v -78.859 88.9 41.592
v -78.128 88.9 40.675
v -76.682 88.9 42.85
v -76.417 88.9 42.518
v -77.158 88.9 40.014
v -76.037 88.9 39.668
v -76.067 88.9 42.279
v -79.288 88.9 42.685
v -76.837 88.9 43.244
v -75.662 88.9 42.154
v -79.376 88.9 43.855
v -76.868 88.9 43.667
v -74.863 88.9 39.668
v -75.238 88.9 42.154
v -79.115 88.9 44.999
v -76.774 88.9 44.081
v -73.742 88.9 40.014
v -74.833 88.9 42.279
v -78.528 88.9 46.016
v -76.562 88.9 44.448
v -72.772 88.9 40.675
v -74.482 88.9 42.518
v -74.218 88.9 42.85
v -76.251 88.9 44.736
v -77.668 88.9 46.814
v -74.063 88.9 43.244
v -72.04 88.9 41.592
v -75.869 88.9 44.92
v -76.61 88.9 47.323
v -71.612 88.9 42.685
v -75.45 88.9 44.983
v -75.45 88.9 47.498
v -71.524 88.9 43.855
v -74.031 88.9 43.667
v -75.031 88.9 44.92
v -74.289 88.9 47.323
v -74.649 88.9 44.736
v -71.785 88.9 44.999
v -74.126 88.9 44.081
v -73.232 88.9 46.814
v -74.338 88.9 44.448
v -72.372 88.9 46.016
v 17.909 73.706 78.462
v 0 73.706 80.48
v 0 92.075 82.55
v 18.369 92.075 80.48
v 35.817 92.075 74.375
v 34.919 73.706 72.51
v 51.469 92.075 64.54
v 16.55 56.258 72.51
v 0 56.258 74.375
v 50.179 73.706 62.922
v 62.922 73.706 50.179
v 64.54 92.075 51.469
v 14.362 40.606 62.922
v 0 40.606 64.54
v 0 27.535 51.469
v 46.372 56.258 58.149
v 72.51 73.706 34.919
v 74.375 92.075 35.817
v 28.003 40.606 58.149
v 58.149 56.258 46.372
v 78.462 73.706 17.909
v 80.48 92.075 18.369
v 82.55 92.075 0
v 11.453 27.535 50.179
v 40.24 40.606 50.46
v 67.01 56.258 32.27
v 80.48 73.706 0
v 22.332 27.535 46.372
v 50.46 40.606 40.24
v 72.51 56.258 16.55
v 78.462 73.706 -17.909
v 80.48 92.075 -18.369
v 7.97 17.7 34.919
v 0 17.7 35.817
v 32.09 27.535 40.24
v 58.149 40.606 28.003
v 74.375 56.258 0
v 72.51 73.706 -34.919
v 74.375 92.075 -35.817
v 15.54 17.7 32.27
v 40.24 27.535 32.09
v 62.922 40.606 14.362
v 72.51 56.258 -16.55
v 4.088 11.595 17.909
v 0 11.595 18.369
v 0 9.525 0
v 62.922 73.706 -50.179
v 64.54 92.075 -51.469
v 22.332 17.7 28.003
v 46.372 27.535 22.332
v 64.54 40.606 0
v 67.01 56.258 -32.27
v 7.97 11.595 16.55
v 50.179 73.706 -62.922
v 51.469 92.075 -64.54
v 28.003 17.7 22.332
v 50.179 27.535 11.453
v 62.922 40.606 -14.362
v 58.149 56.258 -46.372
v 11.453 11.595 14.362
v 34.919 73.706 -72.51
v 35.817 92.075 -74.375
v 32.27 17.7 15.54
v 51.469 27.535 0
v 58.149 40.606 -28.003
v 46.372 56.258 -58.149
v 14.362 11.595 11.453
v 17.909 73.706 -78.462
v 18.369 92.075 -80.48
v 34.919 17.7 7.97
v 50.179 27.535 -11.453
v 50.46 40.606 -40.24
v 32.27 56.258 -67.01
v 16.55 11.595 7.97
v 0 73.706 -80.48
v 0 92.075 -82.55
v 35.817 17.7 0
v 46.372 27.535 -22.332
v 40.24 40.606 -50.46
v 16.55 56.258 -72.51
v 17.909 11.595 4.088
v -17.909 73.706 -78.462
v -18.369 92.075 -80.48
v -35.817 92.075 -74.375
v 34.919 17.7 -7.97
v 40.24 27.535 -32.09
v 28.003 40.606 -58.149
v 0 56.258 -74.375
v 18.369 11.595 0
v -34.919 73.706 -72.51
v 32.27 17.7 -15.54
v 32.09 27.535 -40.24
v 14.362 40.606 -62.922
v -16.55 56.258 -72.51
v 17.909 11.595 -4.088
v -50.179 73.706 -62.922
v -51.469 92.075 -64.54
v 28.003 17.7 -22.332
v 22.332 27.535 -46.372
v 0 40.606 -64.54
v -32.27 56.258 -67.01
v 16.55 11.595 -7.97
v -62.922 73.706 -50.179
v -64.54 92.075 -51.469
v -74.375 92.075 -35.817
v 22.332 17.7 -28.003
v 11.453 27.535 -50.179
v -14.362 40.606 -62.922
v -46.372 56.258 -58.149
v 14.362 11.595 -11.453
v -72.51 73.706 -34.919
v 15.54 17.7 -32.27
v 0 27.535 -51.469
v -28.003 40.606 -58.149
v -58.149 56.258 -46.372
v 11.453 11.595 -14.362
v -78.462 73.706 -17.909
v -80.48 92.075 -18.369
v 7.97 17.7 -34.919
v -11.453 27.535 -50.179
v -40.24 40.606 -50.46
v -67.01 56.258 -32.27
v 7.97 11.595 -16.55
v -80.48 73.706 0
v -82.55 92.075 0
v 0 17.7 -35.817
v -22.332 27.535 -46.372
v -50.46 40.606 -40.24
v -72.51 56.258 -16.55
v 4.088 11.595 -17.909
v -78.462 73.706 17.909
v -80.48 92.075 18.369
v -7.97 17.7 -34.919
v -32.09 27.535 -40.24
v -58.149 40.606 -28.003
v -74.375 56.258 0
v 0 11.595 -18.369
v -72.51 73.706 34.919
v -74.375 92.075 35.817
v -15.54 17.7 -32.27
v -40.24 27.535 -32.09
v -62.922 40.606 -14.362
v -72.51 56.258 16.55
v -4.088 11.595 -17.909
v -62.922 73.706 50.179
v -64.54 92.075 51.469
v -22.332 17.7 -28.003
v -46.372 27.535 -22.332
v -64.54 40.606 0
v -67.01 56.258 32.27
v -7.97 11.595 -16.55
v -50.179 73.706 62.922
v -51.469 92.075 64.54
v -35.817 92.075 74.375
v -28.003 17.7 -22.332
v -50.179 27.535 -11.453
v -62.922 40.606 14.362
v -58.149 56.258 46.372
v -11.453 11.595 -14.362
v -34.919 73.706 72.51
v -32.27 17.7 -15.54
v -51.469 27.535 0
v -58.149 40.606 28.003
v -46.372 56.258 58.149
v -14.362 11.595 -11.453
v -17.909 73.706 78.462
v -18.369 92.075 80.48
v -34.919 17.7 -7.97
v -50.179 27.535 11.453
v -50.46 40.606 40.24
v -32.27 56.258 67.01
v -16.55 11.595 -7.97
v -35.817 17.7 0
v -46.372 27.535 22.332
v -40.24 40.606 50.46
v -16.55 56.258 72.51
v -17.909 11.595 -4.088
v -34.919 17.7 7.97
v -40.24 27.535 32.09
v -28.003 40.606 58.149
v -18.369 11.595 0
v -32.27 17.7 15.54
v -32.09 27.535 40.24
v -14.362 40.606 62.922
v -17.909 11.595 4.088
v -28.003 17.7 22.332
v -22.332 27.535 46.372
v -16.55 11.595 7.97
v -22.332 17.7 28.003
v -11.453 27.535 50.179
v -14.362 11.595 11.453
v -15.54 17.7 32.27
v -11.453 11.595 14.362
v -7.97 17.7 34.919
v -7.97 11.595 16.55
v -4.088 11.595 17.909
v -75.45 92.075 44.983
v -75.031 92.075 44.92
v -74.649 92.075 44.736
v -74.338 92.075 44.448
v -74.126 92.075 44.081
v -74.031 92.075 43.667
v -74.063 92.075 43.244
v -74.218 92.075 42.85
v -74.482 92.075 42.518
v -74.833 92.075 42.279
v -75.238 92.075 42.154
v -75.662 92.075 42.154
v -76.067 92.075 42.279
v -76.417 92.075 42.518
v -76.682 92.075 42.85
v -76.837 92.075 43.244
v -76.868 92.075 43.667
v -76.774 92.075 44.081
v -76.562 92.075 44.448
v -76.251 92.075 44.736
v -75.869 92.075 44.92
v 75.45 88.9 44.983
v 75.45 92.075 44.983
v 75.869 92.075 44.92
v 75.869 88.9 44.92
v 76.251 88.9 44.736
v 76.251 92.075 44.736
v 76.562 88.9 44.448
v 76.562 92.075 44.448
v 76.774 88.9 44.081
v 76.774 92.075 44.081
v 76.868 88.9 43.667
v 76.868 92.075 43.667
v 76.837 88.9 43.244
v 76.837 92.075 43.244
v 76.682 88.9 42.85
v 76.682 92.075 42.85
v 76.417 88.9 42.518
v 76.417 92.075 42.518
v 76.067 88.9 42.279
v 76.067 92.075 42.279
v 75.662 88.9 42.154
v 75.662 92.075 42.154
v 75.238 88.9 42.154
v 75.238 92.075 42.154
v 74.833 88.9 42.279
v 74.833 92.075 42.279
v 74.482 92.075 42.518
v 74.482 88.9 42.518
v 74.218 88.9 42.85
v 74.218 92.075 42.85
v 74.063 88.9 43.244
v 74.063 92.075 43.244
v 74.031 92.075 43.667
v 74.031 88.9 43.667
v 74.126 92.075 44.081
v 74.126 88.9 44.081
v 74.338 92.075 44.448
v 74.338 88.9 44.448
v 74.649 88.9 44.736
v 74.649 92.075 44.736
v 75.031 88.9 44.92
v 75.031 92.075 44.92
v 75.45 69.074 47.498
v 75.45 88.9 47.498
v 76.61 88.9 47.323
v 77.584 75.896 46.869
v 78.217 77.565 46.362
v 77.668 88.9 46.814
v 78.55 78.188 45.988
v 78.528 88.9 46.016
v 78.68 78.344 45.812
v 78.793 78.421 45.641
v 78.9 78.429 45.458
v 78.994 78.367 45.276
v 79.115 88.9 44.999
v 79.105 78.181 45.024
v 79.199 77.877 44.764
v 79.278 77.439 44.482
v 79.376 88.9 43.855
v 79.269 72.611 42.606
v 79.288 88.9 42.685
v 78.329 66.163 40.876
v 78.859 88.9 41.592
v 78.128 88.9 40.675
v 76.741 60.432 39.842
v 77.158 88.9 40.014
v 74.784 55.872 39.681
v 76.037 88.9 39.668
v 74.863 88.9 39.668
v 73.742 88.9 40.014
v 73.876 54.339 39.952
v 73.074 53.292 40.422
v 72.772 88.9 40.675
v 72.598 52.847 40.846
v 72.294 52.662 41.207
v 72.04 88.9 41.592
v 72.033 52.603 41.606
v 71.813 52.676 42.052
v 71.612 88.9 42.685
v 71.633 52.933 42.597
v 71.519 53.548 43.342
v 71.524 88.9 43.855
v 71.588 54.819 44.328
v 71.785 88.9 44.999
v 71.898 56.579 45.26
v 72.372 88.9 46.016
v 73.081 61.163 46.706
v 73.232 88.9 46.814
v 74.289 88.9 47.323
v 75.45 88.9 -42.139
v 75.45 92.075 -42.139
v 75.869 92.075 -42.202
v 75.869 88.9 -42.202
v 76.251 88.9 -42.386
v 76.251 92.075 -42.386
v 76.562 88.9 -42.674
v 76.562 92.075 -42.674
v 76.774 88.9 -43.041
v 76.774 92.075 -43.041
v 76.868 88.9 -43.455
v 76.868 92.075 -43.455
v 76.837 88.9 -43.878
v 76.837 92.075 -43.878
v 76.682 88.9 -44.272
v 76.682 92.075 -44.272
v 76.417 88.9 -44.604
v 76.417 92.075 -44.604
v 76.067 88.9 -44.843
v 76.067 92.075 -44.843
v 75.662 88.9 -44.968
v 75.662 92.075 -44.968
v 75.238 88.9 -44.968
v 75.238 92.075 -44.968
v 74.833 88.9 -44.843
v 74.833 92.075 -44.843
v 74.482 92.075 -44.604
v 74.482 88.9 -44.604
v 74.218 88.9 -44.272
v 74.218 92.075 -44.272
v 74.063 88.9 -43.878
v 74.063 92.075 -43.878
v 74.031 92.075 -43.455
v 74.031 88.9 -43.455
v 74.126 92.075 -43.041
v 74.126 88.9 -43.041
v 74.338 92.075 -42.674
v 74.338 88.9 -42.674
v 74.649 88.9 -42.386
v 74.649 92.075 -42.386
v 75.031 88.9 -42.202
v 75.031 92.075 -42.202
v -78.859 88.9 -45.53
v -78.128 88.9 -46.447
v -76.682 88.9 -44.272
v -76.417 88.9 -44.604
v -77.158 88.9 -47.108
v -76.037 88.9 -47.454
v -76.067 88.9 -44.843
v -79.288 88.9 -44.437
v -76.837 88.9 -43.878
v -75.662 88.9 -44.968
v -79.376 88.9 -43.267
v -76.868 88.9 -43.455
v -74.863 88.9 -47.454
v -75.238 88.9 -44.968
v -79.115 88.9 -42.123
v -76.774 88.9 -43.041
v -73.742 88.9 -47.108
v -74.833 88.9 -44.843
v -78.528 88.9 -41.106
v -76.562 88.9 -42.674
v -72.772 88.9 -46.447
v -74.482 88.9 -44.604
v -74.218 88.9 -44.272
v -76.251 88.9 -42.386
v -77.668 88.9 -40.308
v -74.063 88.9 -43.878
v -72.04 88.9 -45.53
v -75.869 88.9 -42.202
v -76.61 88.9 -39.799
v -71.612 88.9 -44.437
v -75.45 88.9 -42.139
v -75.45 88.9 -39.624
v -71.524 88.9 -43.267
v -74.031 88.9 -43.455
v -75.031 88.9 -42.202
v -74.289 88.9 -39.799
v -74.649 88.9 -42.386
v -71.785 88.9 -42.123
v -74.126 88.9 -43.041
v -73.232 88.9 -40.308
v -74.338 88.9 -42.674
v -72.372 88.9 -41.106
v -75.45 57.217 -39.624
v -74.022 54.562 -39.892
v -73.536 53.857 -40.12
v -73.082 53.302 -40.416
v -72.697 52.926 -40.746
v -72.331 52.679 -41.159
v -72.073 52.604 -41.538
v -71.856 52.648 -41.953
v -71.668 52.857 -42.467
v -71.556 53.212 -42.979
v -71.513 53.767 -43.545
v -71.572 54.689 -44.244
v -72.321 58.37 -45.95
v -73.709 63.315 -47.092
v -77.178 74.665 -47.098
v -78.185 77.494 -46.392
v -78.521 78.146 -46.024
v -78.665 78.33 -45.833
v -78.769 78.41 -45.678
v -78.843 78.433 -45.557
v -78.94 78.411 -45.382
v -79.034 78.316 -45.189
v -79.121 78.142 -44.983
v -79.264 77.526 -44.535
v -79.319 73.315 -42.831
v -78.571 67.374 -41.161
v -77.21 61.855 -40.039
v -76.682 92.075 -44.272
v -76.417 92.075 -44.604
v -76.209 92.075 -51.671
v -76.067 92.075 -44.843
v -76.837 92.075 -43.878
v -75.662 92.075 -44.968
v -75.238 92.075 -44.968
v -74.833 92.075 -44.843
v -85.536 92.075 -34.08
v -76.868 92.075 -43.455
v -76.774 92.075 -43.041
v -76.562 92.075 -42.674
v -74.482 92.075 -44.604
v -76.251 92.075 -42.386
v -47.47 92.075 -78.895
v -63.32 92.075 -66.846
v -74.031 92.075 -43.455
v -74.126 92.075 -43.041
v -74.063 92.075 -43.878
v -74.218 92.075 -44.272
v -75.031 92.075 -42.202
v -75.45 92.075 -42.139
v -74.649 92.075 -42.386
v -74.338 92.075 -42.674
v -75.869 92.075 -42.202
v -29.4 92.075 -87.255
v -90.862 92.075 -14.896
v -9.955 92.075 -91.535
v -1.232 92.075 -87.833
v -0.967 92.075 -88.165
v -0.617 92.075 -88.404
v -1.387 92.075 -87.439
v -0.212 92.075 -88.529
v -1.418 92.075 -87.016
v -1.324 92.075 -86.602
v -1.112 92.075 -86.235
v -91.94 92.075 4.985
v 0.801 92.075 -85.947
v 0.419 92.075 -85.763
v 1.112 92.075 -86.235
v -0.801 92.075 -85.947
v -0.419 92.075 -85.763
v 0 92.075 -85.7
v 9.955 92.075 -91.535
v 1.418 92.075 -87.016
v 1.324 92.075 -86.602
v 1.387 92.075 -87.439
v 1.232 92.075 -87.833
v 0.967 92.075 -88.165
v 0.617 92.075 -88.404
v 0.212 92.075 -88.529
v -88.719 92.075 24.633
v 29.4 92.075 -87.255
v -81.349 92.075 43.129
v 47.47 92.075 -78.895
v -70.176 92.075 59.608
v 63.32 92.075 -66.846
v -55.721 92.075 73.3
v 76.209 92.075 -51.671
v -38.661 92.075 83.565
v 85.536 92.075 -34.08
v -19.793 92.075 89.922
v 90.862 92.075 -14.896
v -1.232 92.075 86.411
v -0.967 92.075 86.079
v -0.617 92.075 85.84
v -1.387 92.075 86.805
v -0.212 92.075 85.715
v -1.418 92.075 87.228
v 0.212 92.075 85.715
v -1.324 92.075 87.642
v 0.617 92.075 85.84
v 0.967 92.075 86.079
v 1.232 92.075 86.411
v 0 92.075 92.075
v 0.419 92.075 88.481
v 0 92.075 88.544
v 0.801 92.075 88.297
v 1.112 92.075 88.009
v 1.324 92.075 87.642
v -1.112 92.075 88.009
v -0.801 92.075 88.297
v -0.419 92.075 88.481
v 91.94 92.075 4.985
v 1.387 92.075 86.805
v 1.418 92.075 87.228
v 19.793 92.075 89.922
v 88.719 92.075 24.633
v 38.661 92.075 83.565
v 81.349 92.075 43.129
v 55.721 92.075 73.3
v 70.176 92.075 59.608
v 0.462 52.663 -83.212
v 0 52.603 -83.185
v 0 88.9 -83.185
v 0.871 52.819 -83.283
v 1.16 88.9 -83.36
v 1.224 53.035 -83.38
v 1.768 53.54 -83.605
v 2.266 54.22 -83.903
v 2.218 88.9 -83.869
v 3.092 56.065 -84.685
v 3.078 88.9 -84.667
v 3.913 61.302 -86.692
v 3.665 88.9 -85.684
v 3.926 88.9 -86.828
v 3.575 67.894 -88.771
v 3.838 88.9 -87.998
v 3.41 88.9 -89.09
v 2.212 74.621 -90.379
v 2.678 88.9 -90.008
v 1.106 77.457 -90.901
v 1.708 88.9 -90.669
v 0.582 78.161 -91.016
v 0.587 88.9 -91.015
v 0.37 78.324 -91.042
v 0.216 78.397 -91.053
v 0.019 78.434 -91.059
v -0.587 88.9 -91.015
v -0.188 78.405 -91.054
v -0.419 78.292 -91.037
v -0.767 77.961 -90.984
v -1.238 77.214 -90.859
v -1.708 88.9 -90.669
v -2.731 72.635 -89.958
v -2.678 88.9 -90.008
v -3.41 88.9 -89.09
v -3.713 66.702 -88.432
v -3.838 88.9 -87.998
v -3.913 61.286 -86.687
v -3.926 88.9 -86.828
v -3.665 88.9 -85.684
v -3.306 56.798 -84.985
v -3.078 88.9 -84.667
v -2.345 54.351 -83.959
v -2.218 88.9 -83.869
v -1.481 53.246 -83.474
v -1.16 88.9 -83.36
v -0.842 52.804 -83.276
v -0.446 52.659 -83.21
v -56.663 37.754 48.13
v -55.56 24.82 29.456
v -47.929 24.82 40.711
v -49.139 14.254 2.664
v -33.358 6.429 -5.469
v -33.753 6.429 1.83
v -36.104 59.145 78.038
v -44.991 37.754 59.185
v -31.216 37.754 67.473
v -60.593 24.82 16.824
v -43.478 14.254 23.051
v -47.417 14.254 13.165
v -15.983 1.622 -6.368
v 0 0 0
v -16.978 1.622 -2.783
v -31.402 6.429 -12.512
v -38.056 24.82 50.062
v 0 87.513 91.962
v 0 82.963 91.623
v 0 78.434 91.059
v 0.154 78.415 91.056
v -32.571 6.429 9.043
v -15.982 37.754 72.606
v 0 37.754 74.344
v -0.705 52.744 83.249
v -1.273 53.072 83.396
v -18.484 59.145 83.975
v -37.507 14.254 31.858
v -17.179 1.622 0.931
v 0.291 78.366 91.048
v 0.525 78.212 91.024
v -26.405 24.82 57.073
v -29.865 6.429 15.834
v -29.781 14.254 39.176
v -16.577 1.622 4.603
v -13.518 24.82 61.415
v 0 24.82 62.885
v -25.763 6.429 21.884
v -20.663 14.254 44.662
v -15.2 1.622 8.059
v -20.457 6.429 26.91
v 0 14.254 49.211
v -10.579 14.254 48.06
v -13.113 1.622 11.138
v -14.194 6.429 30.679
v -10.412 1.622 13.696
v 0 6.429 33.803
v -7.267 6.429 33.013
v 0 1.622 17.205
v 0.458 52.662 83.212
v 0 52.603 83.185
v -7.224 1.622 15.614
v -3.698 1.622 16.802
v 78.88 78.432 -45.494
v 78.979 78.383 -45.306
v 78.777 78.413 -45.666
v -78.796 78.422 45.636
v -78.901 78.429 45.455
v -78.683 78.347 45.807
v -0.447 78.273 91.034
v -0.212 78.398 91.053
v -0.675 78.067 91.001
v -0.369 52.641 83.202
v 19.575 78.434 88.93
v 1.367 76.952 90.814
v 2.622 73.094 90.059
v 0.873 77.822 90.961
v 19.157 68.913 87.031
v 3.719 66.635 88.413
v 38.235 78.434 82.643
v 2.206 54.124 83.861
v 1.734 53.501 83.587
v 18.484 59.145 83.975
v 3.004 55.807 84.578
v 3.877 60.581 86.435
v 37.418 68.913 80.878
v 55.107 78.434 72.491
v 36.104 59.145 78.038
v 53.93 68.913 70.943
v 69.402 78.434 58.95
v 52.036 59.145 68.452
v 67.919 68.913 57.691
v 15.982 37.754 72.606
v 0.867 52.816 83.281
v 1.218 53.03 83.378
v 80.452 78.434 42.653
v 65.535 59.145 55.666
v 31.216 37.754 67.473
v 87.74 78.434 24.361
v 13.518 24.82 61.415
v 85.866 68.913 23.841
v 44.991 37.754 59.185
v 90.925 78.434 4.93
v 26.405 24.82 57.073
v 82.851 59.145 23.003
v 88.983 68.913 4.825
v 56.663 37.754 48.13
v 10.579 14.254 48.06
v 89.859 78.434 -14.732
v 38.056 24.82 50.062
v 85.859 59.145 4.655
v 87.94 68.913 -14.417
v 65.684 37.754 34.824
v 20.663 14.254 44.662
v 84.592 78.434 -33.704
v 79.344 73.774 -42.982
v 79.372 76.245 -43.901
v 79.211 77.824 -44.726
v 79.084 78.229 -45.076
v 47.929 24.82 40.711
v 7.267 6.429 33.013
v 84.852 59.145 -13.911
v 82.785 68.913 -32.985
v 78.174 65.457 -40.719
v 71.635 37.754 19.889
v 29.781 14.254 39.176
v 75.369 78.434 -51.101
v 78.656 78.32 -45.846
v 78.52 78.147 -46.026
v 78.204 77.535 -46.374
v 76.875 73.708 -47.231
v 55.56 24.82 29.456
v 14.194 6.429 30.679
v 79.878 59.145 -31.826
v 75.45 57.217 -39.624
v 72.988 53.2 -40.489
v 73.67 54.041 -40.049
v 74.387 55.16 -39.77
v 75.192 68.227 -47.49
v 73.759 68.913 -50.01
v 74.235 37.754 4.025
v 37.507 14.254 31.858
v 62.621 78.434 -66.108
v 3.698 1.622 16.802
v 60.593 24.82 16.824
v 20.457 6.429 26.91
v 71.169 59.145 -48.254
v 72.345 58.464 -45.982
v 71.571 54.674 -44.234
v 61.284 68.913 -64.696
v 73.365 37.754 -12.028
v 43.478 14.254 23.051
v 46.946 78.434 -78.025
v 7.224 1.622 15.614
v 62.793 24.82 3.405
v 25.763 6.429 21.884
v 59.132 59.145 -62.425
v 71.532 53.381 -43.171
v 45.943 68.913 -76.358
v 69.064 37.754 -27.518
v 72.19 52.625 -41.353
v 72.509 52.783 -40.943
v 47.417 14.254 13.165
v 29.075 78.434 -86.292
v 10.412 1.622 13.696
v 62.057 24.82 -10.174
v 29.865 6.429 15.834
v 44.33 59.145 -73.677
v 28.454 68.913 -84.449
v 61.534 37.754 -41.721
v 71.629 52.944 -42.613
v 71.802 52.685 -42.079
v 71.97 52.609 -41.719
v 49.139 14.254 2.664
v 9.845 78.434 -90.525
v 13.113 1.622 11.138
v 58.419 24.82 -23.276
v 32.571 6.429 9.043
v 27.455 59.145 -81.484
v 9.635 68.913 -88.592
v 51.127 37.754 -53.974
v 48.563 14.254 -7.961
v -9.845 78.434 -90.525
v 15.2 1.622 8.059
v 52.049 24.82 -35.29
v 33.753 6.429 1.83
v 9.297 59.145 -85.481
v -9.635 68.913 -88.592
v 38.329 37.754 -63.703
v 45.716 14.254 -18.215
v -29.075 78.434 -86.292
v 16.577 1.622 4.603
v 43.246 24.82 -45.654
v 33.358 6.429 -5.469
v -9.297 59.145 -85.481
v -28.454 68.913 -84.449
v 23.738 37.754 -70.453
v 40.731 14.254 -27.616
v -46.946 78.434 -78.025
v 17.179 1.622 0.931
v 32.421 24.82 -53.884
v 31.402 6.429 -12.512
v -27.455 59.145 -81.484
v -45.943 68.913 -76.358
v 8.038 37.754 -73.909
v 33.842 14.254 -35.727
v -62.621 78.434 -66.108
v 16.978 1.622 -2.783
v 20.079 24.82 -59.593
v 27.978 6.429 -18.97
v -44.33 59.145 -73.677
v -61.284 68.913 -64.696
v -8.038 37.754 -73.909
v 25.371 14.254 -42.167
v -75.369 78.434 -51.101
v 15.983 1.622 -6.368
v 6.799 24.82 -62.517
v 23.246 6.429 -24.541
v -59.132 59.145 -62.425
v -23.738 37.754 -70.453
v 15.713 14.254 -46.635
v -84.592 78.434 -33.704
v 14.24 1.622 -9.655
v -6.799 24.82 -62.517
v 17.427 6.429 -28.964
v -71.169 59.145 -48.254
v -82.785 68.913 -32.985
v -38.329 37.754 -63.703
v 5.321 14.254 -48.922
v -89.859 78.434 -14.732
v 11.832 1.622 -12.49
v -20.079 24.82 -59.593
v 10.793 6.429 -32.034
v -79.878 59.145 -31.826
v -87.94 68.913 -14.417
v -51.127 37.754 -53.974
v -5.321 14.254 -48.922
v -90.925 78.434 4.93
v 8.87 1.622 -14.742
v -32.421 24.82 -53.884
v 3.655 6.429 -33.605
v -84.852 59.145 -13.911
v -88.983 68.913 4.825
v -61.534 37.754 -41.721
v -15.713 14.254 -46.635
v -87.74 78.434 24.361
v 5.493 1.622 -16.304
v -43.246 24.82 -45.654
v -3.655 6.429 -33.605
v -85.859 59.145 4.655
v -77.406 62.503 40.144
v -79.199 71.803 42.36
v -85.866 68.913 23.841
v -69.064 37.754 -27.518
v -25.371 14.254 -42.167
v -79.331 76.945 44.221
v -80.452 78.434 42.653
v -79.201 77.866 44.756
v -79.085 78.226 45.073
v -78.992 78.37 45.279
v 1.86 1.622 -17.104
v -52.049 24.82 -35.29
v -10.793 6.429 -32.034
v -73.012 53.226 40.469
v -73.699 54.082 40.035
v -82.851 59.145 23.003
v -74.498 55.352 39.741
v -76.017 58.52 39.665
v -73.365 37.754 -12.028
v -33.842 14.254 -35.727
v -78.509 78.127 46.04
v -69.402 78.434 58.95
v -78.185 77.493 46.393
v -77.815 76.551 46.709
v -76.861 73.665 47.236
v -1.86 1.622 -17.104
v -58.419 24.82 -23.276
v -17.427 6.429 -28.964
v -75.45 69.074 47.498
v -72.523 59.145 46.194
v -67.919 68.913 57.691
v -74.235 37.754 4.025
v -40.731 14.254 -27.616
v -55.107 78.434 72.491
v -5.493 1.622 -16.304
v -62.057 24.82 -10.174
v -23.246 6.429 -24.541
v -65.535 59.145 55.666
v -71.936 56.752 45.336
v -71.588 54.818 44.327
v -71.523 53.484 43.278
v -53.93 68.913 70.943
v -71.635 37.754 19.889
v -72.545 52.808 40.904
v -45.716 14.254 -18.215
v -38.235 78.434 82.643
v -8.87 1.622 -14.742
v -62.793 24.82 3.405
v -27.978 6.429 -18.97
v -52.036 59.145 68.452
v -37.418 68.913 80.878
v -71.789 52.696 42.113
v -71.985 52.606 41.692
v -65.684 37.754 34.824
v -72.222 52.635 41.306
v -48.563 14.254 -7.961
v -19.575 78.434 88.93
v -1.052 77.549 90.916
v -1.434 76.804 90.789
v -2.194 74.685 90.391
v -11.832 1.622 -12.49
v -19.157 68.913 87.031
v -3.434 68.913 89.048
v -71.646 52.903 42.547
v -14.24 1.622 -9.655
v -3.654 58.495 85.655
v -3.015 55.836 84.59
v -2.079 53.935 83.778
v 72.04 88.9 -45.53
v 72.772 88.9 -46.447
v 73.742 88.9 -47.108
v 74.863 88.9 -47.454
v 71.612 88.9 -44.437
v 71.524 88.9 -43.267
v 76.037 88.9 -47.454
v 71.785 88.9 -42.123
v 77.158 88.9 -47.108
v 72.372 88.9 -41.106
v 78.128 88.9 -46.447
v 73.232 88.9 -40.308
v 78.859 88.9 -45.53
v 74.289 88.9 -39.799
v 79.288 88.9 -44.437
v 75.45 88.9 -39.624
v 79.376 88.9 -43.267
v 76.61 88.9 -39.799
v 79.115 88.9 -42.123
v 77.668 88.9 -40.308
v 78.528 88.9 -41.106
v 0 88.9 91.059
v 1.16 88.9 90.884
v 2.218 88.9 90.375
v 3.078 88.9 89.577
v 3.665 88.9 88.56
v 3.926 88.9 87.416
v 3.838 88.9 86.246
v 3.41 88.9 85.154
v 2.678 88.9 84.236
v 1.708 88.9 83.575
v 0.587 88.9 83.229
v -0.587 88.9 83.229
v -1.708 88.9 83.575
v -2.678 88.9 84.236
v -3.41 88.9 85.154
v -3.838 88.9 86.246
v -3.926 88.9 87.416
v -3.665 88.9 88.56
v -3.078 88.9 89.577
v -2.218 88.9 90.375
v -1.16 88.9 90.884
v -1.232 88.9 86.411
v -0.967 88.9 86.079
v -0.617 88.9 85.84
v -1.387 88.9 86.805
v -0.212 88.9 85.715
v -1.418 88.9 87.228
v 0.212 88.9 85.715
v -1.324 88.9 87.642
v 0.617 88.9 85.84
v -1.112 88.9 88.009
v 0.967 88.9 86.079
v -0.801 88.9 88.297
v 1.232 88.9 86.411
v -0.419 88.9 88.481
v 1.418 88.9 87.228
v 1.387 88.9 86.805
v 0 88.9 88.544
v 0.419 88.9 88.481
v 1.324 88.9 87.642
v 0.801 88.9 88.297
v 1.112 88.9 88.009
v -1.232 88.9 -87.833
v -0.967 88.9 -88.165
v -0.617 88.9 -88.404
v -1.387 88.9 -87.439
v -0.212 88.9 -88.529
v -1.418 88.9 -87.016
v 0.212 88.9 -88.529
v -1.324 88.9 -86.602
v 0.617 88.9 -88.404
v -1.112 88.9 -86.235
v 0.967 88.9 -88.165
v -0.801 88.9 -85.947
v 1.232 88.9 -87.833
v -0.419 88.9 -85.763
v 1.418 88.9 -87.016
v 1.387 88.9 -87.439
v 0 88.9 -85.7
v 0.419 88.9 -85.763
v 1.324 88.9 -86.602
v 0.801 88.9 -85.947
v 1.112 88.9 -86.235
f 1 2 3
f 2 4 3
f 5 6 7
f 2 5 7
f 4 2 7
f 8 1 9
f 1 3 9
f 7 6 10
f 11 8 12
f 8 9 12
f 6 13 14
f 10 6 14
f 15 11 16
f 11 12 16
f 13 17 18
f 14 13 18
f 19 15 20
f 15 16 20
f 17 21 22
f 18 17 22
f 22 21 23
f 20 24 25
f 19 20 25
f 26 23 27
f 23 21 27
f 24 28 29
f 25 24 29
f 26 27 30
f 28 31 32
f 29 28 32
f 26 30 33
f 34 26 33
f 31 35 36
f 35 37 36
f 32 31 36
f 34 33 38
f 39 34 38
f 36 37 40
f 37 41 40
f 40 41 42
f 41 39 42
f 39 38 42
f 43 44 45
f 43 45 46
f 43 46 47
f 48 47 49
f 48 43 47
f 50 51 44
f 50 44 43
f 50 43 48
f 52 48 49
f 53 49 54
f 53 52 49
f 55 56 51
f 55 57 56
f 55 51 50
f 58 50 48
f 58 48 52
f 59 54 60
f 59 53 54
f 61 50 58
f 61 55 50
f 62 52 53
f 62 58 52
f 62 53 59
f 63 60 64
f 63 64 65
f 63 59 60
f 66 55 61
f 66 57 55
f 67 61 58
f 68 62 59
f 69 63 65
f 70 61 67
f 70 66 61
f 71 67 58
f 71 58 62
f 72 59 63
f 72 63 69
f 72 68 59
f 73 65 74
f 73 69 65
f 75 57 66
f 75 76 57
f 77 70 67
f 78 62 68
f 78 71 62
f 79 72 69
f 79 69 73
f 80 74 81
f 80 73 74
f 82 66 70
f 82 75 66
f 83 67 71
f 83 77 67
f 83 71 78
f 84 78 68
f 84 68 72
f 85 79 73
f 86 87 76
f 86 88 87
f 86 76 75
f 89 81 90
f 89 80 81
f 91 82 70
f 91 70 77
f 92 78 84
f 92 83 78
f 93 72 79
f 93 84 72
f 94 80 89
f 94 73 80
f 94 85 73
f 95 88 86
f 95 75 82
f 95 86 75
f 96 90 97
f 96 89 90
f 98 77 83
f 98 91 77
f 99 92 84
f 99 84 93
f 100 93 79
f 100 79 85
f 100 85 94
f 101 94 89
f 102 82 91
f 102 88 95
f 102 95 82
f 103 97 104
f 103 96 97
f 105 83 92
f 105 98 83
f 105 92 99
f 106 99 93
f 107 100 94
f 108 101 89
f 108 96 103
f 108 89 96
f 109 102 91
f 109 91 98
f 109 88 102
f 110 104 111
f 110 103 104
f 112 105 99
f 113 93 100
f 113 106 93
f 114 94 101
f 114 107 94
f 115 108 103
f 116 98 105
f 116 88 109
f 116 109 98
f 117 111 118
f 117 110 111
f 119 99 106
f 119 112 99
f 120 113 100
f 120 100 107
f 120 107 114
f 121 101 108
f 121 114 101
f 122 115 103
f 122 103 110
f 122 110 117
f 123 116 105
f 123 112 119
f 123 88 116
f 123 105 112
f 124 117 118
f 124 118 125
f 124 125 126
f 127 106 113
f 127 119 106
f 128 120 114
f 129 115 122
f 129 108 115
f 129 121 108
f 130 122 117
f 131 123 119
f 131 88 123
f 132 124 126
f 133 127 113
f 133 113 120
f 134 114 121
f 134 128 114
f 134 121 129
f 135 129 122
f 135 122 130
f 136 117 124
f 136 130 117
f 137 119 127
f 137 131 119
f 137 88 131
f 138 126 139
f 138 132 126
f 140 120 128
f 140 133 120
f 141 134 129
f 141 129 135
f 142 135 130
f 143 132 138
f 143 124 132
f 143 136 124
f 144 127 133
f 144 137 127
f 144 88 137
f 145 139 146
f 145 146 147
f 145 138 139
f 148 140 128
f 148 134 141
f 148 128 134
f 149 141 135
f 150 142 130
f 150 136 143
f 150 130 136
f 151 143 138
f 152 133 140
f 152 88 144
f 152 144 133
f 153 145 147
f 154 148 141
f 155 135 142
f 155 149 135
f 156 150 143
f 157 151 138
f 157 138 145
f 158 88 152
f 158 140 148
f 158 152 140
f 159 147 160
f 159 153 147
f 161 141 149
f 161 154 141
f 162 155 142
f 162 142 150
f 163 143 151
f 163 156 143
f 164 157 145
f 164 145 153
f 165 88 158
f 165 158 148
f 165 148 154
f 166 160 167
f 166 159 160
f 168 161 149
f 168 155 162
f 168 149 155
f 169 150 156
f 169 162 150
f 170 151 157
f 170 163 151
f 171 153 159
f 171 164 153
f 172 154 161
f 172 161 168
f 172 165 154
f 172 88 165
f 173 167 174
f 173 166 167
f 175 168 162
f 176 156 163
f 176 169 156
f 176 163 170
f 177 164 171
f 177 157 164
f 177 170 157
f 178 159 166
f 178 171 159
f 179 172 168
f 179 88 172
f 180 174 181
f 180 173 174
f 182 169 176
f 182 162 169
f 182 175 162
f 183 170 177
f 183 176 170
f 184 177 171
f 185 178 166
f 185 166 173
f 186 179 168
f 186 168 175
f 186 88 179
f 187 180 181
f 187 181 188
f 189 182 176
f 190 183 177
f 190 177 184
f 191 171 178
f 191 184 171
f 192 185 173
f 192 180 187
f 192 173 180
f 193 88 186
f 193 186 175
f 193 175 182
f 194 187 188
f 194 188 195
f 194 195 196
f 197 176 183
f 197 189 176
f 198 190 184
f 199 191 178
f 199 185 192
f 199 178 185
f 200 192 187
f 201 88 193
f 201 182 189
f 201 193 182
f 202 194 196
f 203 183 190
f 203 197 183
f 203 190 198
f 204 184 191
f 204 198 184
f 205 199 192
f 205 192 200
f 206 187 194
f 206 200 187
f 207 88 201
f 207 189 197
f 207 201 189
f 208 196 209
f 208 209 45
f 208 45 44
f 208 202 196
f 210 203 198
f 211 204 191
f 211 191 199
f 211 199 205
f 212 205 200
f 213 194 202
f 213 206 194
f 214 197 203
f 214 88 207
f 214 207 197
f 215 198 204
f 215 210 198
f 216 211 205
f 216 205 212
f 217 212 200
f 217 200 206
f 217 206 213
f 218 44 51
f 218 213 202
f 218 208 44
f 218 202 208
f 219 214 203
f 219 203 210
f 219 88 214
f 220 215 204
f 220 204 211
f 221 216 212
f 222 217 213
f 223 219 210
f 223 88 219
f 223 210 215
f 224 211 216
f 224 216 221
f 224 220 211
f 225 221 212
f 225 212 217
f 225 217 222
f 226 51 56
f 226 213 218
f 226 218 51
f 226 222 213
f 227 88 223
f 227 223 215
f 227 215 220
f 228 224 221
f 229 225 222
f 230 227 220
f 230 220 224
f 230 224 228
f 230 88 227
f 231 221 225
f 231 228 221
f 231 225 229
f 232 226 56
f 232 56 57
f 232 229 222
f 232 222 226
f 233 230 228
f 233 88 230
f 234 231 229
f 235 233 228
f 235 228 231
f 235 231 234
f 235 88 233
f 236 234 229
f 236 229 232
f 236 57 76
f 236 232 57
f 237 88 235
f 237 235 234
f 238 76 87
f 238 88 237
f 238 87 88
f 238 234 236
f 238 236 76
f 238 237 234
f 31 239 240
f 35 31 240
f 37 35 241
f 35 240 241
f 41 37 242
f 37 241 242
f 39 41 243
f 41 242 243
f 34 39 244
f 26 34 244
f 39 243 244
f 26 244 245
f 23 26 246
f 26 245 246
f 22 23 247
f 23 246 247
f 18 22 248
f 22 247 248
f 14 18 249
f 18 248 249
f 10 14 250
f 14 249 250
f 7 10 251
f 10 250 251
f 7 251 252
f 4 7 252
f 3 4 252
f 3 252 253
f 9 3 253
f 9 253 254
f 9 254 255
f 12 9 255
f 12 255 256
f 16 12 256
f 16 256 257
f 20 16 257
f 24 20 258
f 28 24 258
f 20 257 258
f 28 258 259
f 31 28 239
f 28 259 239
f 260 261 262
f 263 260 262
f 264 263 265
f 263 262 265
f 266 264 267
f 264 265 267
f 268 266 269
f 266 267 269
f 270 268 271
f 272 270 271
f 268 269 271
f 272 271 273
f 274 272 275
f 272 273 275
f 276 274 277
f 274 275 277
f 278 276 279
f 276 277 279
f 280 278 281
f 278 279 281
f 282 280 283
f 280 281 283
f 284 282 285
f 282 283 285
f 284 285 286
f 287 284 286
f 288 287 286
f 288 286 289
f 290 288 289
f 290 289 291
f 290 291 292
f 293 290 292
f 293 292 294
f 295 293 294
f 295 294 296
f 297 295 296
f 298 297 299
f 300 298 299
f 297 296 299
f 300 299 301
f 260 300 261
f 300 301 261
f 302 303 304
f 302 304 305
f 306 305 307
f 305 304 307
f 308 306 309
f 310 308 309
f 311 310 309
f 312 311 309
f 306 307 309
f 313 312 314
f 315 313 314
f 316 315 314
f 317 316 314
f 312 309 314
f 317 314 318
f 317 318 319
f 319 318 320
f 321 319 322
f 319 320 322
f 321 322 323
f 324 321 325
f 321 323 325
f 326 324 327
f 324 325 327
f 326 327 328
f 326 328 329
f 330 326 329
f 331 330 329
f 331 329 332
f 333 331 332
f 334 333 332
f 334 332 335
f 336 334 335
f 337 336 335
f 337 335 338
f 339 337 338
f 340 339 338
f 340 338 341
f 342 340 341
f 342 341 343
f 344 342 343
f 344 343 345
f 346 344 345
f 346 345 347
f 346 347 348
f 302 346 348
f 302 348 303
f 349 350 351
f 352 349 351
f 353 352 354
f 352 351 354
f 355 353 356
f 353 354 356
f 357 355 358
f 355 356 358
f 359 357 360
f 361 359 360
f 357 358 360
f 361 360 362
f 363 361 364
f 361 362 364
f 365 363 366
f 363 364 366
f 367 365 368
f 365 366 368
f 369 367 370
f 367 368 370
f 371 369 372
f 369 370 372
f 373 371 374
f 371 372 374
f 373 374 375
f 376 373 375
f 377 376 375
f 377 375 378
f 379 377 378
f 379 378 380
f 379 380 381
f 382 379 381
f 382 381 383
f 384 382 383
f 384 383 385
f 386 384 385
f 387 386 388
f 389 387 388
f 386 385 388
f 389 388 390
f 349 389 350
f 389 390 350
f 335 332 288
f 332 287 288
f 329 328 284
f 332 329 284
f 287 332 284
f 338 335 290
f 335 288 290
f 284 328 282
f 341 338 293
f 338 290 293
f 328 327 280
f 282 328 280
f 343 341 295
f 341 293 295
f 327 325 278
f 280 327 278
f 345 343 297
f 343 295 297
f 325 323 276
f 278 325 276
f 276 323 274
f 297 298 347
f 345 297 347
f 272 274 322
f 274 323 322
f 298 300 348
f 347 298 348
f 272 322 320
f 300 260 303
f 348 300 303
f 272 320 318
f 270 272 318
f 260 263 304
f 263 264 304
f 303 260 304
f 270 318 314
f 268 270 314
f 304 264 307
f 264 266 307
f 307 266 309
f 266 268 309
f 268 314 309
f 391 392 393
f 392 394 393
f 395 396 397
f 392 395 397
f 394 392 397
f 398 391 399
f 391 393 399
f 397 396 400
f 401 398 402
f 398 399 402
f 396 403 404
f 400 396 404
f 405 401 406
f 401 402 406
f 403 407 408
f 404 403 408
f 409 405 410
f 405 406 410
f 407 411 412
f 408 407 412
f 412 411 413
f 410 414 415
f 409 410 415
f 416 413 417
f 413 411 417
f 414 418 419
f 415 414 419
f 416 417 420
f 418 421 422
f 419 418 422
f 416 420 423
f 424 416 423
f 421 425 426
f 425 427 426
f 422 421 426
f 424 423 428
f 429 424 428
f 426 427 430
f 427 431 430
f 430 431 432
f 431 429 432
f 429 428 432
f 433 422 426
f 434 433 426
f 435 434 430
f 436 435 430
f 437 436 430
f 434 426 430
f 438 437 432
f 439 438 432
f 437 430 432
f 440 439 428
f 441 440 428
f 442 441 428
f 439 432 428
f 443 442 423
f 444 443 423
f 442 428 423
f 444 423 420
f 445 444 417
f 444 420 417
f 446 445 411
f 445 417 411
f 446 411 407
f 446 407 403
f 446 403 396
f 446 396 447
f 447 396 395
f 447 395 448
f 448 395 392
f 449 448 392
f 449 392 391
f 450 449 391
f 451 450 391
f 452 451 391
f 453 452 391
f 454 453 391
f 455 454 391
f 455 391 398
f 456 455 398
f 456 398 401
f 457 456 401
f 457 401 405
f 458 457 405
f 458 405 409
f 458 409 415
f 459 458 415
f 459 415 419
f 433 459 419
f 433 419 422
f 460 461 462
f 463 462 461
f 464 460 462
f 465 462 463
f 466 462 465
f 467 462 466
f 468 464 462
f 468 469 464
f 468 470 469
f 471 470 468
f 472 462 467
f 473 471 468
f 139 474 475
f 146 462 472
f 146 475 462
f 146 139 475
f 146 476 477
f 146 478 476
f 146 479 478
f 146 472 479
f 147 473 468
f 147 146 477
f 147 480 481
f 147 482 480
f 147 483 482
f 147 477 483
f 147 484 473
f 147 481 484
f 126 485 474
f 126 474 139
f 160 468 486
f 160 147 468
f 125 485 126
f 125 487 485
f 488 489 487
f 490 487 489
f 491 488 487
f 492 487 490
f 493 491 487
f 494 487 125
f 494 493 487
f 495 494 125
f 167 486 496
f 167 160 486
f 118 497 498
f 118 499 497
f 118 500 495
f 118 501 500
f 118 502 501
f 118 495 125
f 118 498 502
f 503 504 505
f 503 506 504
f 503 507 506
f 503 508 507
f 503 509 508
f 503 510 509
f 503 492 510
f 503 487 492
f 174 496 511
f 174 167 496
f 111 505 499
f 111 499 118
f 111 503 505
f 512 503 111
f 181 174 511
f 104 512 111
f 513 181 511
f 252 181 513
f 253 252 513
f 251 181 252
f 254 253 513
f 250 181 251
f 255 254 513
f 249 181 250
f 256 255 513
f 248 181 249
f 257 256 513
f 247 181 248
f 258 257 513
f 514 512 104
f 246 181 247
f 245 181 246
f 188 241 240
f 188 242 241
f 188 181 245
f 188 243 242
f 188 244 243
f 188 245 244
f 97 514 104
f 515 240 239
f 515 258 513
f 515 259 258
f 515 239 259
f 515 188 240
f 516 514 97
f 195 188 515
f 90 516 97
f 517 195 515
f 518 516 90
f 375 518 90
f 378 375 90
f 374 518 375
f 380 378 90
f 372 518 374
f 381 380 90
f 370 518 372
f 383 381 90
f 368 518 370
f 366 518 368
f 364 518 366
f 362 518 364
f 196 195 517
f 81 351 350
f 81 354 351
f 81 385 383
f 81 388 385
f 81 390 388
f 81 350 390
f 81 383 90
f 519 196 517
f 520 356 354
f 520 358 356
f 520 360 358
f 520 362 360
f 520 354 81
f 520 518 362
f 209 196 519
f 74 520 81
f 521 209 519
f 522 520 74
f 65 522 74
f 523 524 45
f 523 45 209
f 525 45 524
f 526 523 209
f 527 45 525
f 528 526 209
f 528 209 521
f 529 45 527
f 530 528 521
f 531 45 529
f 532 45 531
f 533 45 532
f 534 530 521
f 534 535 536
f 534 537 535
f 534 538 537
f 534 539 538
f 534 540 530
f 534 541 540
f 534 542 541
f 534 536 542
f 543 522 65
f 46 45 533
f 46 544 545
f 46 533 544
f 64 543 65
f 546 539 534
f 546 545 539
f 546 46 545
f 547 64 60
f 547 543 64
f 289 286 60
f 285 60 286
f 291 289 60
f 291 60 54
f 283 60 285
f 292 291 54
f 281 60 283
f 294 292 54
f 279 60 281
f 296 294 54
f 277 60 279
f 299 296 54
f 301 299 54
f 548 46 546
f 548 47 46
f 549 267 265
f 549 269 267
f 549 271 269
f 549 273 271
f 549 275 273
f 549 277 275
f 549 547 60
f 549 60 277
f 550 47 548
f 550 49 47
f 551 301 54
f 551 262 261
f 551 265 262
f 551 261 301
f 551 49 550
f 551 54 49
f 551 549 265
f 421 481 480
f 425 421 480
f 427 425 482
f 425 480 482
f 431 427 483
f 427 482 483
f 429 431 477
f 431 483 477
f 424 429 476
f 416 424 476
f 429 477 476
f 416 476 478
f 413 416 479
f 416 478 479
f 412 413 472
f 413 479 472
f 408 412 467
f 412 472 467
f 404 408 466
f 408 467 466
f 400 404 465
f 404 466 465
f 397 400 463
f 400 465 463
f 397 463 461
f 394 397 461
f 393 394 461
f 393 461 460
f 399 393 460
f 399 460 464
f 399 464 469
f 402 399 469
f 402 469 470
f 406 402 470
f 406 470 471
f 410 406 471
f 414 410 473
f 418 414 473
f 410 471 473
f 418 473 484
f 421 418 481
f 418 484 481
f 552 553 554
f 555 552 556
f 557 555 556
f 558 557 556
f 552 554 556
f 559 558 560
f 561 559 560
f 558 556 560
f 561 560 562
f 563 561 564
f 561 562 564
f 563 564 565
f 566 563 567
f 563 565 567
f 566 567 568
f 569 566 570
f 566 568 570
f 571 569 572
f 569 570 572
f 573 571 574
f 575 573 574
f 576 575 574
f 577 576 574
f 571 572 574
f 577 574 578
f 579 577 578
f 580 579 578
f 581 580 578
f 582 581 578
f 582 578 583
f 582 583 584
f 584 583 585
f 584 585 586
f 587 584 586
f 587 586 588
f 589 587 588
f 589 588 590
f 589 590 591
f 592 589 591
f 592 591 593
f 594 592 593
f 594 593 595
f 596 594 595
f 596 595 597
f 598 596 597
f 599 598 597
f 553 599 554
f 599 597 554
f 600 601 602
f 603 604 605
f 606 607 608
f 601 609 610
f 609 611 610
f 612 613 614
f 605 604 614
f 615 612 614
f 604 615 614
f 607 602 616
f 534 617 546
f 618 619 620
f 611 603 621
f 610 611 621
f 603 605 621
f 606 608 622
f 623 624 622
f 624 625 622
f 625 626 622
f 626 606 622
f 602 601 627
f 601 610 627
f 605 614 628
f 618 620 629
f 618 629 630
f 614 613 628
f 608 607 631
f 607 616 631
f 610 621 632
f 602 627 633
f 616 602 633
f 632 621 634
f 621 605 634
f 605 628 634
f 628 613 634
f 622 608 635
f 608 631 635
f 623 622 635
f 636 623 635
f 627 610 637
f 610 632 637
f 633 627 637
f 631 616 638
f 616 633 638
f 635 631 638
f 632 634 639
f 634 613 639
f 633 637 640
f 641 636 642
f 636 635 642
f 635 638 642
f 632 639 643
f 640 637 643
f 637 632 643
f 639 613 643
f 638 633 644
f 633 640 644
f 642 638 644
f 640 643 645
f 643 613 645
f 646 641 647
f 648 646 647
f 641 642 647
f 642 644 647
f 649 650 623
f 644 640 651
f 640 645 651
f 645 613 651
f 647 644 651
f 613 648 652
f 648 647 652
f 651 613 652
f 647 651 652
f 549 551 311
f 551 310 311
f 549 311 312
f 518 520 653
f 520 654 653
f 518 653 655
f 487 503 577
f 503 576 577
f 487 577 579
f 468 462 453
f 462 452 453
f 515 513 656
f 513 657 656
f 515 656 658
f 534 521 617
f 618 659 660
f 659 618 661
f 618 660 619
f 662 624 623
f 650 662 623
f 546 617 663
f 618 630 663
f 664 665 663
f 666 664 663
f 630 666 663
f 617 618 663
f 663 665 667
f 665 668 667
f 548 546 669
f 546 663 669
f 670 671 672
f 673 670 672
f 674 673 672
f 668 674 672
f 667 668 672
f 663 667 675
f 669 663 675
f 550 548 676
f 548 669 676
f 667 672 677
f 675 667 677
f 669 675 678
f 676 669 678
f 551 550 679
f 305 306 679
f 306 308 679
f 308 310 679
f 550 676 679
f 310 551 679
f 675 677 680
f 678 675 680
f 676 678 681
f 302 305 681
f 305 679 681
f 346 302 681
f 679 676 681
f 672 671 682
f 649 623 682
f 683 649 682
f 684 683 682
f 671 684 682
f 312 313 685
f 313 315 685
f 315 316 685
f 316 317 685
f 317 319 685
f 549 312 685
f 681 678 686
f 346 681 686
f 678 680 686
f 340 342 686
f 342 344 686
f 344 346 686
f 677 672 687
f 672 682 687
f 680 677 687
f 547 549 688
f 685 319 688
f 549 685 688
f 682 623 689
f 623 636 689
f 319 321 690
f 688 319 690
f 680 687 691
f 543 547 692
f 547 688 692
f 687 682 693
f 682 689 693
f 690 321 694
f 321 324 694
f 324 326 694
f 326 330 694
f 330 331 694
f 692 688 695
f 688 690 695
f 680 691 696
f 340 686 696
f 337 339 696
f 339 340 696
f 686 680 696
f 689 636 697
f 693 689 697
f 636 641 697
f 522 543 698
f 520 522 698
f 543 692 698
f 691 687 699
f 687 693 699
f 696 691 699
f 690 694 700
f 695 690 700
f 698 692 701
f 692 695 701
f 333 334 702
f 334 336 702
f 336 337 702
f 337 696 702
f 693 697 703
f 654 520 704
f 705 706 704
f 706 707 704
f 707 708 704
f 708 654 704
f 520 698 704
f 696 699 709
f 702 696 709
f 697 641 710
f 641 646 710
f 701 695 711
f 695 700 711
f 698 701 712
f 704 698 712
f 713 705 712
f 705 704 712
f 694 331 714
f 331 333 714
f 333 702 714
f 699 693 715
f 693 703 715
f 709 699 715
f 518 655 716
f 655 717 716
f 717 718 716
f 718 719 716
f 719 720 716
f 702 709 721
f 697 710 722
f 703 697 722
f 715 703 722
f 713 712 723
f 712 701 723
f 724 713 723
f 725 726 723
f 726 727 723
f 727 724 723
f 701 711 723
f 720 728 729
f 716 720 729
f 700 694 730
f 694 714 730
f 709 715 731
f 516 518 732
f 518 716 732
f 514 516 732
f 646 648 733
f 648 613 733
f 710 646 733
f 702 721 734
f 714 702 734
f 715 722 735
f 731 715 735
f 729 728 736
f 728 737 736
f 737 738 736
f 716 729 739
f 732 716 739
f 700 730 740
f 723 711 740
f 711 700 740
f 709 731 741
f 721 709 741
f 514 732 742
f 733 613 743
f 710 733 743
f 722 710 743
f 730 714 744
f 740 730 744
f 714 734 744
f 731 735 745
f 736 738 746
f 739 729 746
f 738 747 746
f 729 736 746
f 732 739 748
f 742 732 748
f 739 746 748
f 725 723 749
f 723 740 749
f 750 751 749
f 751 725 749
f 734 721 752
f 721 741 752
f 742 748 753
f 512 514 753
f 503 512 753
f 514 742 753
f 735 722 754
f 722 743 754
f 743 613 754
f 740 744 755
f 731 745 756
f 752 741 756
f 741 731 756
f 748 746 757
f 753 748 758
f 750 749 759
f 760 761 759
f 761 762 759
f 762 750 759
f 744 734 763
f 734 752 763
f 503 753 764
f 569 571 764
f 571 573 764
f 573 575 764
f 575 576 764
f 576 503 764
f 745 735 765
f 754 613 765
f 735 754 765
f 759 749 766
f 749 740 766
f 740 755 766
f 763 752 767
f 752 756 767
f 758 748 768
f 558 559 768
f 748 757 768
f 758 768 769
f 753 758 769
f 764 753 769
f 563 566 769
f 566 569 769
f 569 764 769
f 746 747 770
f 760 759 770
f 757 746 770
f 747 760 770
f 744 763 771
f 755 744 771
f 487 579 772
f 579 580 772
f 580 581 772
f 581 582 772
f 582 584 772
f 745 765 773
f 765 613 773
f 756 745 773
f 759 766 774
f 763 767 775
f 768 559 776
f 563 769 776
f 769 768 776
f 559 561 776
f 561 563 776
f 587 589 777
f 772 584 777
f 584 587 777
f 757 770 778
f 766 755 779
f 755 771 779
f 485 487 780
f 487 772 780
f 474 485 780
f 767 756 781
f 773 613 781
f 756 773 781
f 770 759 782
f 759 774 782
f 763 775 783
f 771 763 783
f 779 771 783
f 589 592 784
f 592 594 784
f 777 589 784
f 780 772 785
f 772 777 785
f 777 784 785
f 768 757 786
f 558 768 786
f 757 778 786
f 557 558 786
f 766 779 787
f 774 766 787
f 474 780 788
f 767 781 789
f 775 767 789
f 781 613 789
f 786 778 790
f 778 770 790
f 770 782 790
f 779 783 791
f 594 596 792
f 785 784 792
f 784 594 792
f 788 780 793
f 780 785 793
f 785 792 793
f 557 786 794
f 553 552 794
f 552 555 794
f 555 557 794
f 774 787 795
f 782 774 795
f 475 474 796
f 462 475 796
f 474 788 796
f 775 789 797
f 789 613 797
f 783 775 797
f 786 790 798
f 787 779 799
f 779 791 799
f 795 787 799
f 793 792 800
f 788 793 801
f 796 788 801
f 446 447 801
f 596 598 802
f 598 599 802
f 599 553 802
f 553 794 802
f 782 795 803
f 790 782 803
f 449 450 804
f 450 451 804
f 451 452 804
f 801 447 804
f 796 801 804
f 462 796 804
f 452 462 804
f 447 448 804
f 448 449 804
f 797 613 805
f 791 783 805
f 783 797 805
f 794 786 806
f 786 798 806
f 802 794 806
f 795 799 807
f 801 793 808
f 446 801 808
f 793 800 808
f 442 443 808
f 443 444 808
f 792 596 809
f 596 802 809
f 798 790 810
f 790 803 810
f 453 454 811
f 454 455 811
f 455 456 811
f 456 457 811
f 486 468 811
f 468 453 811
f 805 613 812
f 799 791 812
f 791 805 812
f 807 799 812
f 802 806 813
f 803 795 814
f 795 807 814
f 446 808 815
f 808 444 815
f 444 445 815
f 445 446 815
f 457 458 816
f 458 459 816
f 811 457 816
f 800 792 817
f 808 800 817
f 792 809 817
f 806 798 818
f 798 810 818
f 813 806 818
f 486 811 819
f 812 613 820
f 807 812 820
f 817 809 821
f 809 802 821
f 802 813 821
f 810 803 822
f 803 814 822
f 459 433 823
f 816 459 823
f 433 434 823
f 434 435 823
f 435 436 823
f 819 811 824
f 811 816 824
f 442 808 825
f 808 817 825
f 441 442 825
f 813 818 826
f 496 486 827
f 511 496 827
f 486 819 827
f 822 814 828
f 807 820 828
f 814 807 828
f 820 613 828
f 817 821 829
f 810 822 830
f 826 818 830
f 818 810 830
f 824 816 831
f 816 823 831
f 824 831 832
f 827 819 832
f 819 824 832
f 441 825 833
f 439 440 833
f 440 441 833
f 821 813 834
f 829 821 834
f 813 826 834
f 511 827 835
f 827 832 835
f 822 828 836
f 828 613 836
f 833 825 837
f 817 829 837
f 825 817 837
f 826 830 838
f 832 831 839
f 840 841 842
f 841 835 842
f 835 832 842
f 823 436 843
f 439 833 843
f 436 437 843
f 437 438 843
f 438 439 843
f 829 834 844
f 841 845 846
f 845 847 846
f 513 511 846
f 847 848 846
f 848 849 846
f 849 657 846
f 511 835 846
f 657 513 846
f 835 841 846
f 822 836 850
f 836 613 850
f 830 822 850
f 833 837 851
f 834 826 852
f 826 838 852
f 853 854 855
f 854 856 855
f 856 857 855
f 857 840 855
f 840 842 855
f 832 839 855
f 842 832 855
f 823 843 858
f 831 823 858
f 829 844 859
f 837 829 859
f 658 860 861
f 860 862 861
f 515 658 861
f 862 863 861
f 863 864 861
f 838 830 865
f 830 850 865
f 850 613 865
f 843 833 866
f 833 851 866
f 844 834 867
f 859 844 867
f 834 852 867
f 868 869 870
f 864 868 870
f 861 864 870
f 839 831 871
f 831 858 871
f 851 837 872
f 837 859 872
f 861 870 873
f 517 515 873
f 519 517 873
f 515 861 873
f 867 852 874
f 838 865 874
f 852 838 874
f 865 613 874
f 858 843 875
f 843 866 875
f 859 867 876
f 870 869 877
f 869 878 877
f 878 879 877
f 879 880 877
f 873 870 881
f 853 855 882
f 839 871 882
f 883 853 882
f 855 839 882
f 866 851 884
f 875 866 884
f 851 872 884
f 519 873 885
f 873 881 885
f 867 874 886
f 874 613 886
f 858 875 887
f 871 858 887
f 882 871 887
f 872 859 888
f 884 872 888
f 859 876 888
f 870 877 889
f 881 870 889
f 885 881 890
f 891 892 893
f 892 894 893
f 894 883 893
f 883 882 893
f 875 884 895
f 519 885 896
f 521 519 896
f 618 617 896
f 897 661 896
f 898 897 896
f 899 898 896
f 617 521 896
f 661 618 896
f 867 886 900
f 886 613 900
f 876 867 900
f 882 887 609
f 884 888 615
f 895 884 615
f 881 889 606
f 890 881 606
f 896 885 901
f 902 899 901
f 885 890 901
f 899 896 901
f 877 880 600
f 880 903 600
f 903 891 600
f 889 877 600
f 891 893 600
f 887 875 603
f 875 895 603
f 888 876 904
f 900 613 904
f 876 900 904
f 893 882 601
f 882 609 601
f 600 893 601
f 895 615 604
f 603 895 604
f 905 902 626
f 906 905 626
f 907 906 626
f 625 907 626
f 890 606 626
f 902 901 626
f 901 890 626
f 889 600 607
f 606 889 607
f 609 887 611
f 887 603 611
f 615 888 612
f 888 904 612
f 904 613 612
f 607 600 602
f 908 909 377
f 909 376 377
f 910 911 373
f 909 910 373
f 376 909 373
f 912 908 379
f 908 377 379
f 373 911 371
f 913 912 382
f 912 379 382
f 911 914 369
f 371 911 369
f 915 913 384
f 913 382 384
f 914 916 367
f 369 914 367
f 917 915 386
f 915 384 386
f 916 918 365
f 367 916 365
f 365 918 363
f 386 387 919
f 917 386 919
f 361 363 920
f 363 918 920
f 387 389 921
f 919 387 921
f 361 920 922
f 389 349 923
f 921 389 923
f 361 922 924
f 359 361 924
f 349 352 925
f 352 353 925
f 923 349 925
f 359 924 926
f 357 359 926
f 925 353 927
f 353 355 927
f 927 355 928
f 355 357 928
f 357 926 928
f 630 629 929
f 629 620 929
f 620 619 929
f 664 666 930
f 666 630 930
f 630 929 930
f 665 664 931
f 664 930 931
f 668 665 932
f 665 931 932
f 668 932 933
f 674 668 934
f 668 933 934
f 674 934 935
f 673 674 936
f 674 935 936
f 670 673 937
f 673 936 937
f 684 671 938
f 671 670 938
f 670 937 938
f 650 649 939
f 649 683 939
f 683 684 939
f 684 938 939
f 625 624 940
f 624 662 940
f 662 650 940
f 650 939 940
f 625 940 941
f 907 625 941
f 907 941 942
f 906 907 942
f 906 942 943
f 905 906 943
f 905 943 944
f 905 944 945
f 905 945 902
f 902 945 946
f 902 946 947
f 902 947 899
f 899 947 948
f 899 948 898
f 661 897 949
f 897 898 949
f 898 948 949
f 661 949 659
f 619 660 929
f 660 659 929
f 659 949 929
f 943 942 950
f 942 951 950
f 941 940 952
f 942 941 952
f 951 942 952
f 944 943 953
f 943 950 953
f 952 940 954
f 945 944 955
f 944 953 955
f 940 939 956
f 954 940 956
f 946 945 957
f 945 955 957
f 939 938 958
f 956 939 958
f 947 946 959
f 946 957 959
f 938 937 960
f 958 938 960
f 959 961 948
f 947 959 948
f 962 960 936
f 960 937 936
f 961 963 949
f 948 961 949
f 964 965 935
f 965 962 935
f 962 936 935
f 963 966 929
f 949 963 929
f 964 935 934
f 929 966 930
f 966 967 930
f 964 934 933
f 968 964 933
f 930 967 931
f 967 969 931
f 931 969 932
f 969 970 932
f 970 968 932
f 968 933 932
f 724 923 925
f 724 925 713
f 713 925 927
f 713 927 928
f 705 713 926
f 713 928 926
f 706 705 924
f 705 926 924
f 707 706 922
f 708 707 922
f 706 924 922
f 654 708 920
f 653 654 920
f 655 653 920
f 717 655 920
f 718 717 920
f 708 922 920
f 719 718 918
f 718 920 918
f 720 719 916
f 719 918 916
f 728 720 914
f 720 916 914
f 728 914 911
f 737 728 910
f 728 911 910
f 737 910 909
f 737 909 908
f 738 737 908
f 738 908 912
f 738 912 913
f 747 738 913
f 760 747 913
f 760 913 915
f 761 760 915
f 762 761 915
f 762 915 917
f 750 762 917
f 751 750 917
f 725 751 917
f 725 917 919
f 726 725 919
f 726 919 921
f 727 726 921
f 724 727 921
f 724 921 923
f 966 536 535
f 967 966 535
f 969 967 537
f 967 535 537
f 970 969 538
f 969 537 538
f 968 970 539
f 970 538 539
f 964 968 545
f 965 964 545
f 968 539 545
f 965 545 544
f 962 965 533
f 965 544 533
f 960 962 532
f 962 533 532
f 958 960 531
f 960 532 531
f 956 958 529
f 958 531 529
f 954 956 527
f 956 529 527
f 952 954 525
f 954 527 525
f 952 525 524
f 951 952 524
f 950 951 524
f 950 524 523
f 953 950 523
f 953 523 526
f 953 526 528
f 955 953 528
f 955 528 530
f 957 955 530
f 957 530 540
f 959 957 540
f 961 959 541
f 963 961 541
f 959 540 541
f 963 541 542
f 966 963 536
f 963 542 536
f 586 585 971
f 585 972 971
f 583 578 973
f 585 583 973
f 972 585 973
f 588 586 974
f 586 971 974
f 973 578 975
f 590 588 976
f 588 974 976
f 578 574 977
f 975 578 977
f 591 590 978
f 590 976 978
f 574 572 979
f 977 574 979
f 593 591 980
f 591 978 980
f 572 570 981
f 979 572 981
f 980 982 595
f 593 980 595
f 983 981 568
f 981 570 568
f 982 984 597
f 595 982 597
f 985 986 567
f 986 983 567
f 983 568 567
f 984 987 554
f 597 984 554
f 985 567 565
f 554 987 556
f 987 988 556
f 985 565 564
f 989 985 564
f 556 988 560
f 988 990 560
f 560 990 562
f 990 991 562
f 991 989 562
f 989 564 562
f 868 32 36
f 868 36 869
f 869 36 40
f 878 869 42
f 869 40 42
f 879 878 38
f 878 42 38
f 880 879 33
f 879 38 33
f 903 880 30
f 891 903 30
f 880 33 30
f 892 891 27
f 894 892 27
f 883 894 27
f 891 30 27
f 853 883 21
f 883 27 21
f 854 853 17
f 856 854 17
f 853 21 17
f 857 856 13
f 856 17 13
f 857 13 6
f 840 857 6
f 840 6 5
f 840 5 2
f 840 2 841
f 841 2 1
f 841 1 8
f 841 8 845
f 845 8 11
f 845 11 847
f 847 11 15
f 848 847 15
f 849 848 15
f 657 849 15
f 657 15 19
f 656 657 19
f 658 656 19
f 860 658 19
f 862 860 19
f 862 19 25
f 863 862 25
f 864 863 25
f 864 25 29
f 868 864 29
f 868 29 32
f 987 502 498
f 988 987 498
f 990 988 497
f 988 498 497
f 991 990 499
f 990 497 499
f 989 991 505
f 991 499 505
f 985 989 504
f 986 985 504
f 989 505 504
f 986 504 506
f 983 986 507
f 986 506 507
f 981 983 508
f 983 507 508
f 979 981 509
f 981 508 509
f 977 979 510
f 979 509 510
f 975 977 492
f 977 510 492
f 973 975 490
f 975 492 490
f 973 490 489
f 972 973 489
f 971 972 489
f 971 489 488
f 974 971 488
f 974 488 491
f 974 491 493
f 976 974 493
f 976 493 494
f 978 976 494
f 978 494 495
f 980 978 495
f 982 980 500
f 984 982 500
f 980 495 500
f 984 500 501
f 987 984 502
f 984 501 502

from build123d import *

# Parameters (mm, degrees)
SKETCH1_R           = 92.075
BOSS_EXTRUDE3_DEPTH = 92.075
SKETCH3_R           = 82.55
CUT_EXTRUDE1_DEPTH  = 82.55
FILLET12_R          = 82.55
FILLET13_R          = 92.075
SKETCH6_R           = 3.937
CUT_EXTRUDE3_DEPTH  = 50.8
SKETCH8_R           = 3.937
SKETCH8_R_2         = 1.4224
BOSS_EXTRUDE6_DEPTH = 3.175


with BuildPart() as part:
    # Sketch1 → Boss-Extrude3 (new body)
    with BuildSketch(Plane(origin=(0, 0, 0), x_dir=(1, 0, 0), z_dir=(0, 1, 0))):
        with Locations(Location((0, 0, 0), (0, 0, 270))):
            Circle(SKETCH1_R)
    extrude(amount=BOSS_EXTRUDE3_DEPTH)

    # Sketch3 → Cut-Extrude1 (cut)
    with BuildSketch(Plane(origin=(0, 92.075, 0), x_dir=(1, 0, 0), z_dir=(0, 1, 0))):
        with Locations(Location((0, 0, 0), (0, 0, 270))):
            Circle(SKETCH3_R)
    extrude(amount=-CUT_EXTRUDE1_DEPTH, mode=Mode.SUBTRACT)

    # Fillet12
    fillet12_edges = [part.edges().sort_by_distance(p)[0] for p in [
        (0, 9.525, -82.55),
    ]]
    fillet(fillet12_edges, radius=FILLET12_R - 0.0001)  # a hair under: the kernel refuses the full size

    # Fillet13
    fillet13_edges = [part.edges().sort_by_distance(p)[0] for p in [
        (0, 0, -92.075),
    ]]
    fillet(fillet13_edges, radius=FILLET13_R - 0.0001)  # a hair under: the kernel refuses the full size

    # Sketch6 → Cut-Extrude3 (cut)
    with BuildSketch(Plane(origin=(0, 92.075, 0), x_dir=(1, 0, 0), z_dir=(0, 1, 0))):
        with Locations(Location((0, 87.122, 0), (0, 0, 270))):
            Circle(SKETCH6_R)
        with Locations(Location((75.449865229, 43.561, 0), (0, 0, 270))):
            Circle(SKETCH6_R)
        with Locations(Location((75.449865229, -43.561, 0), (0, 0, 270))):
            Circle(SKETCH6_R)
        with Locations(Location((0, -87.122, 0), (0, 0, 270))):
            Circle(SKETCH6_R)
        with Locations(Location((-75.449865229, -43.561, 0), (0, 0, 270))):
            Circle(SKETCH6_R)
        with Locations(Location((-75.449865229, 43.561, 0), (0, 0, 270))):
            Circle(SKETCH6_R)
    extrude(amount=-CUT_EXTRUDE3_DEPTH, mode=Mode.SUBTRACT)

    # Sketch8 → Boss-Extrude6 (add)
    # profile 1 of 6: a face of its own
    with BuildSketch(Plane(origin=(0, 92.075, 0), x_dir=(1, 0, 0), z_dir=(0, 1, 0))):
        with Locations(Location((-75.449865229, -43.561, 0), (0, 0, 270))):
            Circle(SKETCH8_R)
        with Locations(Location((-75.449865229, -43.561, 0), (0, 0, 270))):
            Circle(SKETCH8_R_2, mode=Mode.SUBTRACT)
    # profile 2 of 6: a face of its own
    with BuildSketch(Plane(origin=(0, 92.075, 0), x_dir=(1, 0, 0), z_dir=(0, 1, 0))):
        with Locations(Location((0, -87.122, 0), (0, 0, 270))):
            Circle(SKETCH8_R)
        with Locations(Location((0, -87.122, 0), (0, 0, 270))):
            Circle(SKETCH8_R_2, mode=Mode.SUBTRACT)
    # profile 3 of 6: a face of its own
    with BuildSketch(Plane(origin=(0, 92.075, 0), x_dir=(1, 0, 0), z_dir=(0, 1, 0))):
        with Locations(Location((75.449865229, -43.561, 0), (0, 0, 270))):
            Circle(SKETCH8_R)
        with Locations(Location((75.449865229, -43.561, 0), (0, 0, 270))):
            Circle(SKETCH8_R_2, mode=Mode.SUBTRACT)
    # profile 4 of 6: a face of its own
    with BuildSketch(Plane(origin=(0, 92.075, 0), x_dir=(1, 0, 0), z_dir=(0, 1, 0))):
        with Locations(Location((75.449865229, 43.561, 0), (0, 0, 270))):
            Circle(SKETCH8_R)
        with Locations(Location((75.449865229, 43.561, 0), (0, 0, 270))):
            Circle(SKETCH8_R_2, mode=Mode.SUBTRACT)
    # profile 5 of 6: a face of its own
    with BuildSketch(Plane(origin=(0, 92.075, 0), x_dir=(1, 0, 0), z_dir=(0, 1, 0))):
        with Locations(Location((0, 87.122, 0), (0, 0, 270))):
            Circle(SKETCH8_R)
        with Locations(Location((0, 87.122, 0), (0, 0, 270))):
            Circle(SKETCH8_R_2, mode=Mode.SUBTRACT)
    # profile 6 of 6: a face of its own
    with BuildSketch(Plane(origin=(0, 92.075, 0), x_dir=(1, 0, 0), z_dir=(0, 1, 0))):
        with Locations(Location((-75.449865229, 43.561, 0), (0, 0, 270))):
            Circle(SKETCH8_R)
        with Locations(Location((-75.449865229, 43.561, 0), (0, 0, 270))):
            Circle(SKETCH8_R_2, mode=Mode.SUBTRACT)
    extrude(amount=-BOSS_EXTRUDE6_DEPTH)


solid = part.part
